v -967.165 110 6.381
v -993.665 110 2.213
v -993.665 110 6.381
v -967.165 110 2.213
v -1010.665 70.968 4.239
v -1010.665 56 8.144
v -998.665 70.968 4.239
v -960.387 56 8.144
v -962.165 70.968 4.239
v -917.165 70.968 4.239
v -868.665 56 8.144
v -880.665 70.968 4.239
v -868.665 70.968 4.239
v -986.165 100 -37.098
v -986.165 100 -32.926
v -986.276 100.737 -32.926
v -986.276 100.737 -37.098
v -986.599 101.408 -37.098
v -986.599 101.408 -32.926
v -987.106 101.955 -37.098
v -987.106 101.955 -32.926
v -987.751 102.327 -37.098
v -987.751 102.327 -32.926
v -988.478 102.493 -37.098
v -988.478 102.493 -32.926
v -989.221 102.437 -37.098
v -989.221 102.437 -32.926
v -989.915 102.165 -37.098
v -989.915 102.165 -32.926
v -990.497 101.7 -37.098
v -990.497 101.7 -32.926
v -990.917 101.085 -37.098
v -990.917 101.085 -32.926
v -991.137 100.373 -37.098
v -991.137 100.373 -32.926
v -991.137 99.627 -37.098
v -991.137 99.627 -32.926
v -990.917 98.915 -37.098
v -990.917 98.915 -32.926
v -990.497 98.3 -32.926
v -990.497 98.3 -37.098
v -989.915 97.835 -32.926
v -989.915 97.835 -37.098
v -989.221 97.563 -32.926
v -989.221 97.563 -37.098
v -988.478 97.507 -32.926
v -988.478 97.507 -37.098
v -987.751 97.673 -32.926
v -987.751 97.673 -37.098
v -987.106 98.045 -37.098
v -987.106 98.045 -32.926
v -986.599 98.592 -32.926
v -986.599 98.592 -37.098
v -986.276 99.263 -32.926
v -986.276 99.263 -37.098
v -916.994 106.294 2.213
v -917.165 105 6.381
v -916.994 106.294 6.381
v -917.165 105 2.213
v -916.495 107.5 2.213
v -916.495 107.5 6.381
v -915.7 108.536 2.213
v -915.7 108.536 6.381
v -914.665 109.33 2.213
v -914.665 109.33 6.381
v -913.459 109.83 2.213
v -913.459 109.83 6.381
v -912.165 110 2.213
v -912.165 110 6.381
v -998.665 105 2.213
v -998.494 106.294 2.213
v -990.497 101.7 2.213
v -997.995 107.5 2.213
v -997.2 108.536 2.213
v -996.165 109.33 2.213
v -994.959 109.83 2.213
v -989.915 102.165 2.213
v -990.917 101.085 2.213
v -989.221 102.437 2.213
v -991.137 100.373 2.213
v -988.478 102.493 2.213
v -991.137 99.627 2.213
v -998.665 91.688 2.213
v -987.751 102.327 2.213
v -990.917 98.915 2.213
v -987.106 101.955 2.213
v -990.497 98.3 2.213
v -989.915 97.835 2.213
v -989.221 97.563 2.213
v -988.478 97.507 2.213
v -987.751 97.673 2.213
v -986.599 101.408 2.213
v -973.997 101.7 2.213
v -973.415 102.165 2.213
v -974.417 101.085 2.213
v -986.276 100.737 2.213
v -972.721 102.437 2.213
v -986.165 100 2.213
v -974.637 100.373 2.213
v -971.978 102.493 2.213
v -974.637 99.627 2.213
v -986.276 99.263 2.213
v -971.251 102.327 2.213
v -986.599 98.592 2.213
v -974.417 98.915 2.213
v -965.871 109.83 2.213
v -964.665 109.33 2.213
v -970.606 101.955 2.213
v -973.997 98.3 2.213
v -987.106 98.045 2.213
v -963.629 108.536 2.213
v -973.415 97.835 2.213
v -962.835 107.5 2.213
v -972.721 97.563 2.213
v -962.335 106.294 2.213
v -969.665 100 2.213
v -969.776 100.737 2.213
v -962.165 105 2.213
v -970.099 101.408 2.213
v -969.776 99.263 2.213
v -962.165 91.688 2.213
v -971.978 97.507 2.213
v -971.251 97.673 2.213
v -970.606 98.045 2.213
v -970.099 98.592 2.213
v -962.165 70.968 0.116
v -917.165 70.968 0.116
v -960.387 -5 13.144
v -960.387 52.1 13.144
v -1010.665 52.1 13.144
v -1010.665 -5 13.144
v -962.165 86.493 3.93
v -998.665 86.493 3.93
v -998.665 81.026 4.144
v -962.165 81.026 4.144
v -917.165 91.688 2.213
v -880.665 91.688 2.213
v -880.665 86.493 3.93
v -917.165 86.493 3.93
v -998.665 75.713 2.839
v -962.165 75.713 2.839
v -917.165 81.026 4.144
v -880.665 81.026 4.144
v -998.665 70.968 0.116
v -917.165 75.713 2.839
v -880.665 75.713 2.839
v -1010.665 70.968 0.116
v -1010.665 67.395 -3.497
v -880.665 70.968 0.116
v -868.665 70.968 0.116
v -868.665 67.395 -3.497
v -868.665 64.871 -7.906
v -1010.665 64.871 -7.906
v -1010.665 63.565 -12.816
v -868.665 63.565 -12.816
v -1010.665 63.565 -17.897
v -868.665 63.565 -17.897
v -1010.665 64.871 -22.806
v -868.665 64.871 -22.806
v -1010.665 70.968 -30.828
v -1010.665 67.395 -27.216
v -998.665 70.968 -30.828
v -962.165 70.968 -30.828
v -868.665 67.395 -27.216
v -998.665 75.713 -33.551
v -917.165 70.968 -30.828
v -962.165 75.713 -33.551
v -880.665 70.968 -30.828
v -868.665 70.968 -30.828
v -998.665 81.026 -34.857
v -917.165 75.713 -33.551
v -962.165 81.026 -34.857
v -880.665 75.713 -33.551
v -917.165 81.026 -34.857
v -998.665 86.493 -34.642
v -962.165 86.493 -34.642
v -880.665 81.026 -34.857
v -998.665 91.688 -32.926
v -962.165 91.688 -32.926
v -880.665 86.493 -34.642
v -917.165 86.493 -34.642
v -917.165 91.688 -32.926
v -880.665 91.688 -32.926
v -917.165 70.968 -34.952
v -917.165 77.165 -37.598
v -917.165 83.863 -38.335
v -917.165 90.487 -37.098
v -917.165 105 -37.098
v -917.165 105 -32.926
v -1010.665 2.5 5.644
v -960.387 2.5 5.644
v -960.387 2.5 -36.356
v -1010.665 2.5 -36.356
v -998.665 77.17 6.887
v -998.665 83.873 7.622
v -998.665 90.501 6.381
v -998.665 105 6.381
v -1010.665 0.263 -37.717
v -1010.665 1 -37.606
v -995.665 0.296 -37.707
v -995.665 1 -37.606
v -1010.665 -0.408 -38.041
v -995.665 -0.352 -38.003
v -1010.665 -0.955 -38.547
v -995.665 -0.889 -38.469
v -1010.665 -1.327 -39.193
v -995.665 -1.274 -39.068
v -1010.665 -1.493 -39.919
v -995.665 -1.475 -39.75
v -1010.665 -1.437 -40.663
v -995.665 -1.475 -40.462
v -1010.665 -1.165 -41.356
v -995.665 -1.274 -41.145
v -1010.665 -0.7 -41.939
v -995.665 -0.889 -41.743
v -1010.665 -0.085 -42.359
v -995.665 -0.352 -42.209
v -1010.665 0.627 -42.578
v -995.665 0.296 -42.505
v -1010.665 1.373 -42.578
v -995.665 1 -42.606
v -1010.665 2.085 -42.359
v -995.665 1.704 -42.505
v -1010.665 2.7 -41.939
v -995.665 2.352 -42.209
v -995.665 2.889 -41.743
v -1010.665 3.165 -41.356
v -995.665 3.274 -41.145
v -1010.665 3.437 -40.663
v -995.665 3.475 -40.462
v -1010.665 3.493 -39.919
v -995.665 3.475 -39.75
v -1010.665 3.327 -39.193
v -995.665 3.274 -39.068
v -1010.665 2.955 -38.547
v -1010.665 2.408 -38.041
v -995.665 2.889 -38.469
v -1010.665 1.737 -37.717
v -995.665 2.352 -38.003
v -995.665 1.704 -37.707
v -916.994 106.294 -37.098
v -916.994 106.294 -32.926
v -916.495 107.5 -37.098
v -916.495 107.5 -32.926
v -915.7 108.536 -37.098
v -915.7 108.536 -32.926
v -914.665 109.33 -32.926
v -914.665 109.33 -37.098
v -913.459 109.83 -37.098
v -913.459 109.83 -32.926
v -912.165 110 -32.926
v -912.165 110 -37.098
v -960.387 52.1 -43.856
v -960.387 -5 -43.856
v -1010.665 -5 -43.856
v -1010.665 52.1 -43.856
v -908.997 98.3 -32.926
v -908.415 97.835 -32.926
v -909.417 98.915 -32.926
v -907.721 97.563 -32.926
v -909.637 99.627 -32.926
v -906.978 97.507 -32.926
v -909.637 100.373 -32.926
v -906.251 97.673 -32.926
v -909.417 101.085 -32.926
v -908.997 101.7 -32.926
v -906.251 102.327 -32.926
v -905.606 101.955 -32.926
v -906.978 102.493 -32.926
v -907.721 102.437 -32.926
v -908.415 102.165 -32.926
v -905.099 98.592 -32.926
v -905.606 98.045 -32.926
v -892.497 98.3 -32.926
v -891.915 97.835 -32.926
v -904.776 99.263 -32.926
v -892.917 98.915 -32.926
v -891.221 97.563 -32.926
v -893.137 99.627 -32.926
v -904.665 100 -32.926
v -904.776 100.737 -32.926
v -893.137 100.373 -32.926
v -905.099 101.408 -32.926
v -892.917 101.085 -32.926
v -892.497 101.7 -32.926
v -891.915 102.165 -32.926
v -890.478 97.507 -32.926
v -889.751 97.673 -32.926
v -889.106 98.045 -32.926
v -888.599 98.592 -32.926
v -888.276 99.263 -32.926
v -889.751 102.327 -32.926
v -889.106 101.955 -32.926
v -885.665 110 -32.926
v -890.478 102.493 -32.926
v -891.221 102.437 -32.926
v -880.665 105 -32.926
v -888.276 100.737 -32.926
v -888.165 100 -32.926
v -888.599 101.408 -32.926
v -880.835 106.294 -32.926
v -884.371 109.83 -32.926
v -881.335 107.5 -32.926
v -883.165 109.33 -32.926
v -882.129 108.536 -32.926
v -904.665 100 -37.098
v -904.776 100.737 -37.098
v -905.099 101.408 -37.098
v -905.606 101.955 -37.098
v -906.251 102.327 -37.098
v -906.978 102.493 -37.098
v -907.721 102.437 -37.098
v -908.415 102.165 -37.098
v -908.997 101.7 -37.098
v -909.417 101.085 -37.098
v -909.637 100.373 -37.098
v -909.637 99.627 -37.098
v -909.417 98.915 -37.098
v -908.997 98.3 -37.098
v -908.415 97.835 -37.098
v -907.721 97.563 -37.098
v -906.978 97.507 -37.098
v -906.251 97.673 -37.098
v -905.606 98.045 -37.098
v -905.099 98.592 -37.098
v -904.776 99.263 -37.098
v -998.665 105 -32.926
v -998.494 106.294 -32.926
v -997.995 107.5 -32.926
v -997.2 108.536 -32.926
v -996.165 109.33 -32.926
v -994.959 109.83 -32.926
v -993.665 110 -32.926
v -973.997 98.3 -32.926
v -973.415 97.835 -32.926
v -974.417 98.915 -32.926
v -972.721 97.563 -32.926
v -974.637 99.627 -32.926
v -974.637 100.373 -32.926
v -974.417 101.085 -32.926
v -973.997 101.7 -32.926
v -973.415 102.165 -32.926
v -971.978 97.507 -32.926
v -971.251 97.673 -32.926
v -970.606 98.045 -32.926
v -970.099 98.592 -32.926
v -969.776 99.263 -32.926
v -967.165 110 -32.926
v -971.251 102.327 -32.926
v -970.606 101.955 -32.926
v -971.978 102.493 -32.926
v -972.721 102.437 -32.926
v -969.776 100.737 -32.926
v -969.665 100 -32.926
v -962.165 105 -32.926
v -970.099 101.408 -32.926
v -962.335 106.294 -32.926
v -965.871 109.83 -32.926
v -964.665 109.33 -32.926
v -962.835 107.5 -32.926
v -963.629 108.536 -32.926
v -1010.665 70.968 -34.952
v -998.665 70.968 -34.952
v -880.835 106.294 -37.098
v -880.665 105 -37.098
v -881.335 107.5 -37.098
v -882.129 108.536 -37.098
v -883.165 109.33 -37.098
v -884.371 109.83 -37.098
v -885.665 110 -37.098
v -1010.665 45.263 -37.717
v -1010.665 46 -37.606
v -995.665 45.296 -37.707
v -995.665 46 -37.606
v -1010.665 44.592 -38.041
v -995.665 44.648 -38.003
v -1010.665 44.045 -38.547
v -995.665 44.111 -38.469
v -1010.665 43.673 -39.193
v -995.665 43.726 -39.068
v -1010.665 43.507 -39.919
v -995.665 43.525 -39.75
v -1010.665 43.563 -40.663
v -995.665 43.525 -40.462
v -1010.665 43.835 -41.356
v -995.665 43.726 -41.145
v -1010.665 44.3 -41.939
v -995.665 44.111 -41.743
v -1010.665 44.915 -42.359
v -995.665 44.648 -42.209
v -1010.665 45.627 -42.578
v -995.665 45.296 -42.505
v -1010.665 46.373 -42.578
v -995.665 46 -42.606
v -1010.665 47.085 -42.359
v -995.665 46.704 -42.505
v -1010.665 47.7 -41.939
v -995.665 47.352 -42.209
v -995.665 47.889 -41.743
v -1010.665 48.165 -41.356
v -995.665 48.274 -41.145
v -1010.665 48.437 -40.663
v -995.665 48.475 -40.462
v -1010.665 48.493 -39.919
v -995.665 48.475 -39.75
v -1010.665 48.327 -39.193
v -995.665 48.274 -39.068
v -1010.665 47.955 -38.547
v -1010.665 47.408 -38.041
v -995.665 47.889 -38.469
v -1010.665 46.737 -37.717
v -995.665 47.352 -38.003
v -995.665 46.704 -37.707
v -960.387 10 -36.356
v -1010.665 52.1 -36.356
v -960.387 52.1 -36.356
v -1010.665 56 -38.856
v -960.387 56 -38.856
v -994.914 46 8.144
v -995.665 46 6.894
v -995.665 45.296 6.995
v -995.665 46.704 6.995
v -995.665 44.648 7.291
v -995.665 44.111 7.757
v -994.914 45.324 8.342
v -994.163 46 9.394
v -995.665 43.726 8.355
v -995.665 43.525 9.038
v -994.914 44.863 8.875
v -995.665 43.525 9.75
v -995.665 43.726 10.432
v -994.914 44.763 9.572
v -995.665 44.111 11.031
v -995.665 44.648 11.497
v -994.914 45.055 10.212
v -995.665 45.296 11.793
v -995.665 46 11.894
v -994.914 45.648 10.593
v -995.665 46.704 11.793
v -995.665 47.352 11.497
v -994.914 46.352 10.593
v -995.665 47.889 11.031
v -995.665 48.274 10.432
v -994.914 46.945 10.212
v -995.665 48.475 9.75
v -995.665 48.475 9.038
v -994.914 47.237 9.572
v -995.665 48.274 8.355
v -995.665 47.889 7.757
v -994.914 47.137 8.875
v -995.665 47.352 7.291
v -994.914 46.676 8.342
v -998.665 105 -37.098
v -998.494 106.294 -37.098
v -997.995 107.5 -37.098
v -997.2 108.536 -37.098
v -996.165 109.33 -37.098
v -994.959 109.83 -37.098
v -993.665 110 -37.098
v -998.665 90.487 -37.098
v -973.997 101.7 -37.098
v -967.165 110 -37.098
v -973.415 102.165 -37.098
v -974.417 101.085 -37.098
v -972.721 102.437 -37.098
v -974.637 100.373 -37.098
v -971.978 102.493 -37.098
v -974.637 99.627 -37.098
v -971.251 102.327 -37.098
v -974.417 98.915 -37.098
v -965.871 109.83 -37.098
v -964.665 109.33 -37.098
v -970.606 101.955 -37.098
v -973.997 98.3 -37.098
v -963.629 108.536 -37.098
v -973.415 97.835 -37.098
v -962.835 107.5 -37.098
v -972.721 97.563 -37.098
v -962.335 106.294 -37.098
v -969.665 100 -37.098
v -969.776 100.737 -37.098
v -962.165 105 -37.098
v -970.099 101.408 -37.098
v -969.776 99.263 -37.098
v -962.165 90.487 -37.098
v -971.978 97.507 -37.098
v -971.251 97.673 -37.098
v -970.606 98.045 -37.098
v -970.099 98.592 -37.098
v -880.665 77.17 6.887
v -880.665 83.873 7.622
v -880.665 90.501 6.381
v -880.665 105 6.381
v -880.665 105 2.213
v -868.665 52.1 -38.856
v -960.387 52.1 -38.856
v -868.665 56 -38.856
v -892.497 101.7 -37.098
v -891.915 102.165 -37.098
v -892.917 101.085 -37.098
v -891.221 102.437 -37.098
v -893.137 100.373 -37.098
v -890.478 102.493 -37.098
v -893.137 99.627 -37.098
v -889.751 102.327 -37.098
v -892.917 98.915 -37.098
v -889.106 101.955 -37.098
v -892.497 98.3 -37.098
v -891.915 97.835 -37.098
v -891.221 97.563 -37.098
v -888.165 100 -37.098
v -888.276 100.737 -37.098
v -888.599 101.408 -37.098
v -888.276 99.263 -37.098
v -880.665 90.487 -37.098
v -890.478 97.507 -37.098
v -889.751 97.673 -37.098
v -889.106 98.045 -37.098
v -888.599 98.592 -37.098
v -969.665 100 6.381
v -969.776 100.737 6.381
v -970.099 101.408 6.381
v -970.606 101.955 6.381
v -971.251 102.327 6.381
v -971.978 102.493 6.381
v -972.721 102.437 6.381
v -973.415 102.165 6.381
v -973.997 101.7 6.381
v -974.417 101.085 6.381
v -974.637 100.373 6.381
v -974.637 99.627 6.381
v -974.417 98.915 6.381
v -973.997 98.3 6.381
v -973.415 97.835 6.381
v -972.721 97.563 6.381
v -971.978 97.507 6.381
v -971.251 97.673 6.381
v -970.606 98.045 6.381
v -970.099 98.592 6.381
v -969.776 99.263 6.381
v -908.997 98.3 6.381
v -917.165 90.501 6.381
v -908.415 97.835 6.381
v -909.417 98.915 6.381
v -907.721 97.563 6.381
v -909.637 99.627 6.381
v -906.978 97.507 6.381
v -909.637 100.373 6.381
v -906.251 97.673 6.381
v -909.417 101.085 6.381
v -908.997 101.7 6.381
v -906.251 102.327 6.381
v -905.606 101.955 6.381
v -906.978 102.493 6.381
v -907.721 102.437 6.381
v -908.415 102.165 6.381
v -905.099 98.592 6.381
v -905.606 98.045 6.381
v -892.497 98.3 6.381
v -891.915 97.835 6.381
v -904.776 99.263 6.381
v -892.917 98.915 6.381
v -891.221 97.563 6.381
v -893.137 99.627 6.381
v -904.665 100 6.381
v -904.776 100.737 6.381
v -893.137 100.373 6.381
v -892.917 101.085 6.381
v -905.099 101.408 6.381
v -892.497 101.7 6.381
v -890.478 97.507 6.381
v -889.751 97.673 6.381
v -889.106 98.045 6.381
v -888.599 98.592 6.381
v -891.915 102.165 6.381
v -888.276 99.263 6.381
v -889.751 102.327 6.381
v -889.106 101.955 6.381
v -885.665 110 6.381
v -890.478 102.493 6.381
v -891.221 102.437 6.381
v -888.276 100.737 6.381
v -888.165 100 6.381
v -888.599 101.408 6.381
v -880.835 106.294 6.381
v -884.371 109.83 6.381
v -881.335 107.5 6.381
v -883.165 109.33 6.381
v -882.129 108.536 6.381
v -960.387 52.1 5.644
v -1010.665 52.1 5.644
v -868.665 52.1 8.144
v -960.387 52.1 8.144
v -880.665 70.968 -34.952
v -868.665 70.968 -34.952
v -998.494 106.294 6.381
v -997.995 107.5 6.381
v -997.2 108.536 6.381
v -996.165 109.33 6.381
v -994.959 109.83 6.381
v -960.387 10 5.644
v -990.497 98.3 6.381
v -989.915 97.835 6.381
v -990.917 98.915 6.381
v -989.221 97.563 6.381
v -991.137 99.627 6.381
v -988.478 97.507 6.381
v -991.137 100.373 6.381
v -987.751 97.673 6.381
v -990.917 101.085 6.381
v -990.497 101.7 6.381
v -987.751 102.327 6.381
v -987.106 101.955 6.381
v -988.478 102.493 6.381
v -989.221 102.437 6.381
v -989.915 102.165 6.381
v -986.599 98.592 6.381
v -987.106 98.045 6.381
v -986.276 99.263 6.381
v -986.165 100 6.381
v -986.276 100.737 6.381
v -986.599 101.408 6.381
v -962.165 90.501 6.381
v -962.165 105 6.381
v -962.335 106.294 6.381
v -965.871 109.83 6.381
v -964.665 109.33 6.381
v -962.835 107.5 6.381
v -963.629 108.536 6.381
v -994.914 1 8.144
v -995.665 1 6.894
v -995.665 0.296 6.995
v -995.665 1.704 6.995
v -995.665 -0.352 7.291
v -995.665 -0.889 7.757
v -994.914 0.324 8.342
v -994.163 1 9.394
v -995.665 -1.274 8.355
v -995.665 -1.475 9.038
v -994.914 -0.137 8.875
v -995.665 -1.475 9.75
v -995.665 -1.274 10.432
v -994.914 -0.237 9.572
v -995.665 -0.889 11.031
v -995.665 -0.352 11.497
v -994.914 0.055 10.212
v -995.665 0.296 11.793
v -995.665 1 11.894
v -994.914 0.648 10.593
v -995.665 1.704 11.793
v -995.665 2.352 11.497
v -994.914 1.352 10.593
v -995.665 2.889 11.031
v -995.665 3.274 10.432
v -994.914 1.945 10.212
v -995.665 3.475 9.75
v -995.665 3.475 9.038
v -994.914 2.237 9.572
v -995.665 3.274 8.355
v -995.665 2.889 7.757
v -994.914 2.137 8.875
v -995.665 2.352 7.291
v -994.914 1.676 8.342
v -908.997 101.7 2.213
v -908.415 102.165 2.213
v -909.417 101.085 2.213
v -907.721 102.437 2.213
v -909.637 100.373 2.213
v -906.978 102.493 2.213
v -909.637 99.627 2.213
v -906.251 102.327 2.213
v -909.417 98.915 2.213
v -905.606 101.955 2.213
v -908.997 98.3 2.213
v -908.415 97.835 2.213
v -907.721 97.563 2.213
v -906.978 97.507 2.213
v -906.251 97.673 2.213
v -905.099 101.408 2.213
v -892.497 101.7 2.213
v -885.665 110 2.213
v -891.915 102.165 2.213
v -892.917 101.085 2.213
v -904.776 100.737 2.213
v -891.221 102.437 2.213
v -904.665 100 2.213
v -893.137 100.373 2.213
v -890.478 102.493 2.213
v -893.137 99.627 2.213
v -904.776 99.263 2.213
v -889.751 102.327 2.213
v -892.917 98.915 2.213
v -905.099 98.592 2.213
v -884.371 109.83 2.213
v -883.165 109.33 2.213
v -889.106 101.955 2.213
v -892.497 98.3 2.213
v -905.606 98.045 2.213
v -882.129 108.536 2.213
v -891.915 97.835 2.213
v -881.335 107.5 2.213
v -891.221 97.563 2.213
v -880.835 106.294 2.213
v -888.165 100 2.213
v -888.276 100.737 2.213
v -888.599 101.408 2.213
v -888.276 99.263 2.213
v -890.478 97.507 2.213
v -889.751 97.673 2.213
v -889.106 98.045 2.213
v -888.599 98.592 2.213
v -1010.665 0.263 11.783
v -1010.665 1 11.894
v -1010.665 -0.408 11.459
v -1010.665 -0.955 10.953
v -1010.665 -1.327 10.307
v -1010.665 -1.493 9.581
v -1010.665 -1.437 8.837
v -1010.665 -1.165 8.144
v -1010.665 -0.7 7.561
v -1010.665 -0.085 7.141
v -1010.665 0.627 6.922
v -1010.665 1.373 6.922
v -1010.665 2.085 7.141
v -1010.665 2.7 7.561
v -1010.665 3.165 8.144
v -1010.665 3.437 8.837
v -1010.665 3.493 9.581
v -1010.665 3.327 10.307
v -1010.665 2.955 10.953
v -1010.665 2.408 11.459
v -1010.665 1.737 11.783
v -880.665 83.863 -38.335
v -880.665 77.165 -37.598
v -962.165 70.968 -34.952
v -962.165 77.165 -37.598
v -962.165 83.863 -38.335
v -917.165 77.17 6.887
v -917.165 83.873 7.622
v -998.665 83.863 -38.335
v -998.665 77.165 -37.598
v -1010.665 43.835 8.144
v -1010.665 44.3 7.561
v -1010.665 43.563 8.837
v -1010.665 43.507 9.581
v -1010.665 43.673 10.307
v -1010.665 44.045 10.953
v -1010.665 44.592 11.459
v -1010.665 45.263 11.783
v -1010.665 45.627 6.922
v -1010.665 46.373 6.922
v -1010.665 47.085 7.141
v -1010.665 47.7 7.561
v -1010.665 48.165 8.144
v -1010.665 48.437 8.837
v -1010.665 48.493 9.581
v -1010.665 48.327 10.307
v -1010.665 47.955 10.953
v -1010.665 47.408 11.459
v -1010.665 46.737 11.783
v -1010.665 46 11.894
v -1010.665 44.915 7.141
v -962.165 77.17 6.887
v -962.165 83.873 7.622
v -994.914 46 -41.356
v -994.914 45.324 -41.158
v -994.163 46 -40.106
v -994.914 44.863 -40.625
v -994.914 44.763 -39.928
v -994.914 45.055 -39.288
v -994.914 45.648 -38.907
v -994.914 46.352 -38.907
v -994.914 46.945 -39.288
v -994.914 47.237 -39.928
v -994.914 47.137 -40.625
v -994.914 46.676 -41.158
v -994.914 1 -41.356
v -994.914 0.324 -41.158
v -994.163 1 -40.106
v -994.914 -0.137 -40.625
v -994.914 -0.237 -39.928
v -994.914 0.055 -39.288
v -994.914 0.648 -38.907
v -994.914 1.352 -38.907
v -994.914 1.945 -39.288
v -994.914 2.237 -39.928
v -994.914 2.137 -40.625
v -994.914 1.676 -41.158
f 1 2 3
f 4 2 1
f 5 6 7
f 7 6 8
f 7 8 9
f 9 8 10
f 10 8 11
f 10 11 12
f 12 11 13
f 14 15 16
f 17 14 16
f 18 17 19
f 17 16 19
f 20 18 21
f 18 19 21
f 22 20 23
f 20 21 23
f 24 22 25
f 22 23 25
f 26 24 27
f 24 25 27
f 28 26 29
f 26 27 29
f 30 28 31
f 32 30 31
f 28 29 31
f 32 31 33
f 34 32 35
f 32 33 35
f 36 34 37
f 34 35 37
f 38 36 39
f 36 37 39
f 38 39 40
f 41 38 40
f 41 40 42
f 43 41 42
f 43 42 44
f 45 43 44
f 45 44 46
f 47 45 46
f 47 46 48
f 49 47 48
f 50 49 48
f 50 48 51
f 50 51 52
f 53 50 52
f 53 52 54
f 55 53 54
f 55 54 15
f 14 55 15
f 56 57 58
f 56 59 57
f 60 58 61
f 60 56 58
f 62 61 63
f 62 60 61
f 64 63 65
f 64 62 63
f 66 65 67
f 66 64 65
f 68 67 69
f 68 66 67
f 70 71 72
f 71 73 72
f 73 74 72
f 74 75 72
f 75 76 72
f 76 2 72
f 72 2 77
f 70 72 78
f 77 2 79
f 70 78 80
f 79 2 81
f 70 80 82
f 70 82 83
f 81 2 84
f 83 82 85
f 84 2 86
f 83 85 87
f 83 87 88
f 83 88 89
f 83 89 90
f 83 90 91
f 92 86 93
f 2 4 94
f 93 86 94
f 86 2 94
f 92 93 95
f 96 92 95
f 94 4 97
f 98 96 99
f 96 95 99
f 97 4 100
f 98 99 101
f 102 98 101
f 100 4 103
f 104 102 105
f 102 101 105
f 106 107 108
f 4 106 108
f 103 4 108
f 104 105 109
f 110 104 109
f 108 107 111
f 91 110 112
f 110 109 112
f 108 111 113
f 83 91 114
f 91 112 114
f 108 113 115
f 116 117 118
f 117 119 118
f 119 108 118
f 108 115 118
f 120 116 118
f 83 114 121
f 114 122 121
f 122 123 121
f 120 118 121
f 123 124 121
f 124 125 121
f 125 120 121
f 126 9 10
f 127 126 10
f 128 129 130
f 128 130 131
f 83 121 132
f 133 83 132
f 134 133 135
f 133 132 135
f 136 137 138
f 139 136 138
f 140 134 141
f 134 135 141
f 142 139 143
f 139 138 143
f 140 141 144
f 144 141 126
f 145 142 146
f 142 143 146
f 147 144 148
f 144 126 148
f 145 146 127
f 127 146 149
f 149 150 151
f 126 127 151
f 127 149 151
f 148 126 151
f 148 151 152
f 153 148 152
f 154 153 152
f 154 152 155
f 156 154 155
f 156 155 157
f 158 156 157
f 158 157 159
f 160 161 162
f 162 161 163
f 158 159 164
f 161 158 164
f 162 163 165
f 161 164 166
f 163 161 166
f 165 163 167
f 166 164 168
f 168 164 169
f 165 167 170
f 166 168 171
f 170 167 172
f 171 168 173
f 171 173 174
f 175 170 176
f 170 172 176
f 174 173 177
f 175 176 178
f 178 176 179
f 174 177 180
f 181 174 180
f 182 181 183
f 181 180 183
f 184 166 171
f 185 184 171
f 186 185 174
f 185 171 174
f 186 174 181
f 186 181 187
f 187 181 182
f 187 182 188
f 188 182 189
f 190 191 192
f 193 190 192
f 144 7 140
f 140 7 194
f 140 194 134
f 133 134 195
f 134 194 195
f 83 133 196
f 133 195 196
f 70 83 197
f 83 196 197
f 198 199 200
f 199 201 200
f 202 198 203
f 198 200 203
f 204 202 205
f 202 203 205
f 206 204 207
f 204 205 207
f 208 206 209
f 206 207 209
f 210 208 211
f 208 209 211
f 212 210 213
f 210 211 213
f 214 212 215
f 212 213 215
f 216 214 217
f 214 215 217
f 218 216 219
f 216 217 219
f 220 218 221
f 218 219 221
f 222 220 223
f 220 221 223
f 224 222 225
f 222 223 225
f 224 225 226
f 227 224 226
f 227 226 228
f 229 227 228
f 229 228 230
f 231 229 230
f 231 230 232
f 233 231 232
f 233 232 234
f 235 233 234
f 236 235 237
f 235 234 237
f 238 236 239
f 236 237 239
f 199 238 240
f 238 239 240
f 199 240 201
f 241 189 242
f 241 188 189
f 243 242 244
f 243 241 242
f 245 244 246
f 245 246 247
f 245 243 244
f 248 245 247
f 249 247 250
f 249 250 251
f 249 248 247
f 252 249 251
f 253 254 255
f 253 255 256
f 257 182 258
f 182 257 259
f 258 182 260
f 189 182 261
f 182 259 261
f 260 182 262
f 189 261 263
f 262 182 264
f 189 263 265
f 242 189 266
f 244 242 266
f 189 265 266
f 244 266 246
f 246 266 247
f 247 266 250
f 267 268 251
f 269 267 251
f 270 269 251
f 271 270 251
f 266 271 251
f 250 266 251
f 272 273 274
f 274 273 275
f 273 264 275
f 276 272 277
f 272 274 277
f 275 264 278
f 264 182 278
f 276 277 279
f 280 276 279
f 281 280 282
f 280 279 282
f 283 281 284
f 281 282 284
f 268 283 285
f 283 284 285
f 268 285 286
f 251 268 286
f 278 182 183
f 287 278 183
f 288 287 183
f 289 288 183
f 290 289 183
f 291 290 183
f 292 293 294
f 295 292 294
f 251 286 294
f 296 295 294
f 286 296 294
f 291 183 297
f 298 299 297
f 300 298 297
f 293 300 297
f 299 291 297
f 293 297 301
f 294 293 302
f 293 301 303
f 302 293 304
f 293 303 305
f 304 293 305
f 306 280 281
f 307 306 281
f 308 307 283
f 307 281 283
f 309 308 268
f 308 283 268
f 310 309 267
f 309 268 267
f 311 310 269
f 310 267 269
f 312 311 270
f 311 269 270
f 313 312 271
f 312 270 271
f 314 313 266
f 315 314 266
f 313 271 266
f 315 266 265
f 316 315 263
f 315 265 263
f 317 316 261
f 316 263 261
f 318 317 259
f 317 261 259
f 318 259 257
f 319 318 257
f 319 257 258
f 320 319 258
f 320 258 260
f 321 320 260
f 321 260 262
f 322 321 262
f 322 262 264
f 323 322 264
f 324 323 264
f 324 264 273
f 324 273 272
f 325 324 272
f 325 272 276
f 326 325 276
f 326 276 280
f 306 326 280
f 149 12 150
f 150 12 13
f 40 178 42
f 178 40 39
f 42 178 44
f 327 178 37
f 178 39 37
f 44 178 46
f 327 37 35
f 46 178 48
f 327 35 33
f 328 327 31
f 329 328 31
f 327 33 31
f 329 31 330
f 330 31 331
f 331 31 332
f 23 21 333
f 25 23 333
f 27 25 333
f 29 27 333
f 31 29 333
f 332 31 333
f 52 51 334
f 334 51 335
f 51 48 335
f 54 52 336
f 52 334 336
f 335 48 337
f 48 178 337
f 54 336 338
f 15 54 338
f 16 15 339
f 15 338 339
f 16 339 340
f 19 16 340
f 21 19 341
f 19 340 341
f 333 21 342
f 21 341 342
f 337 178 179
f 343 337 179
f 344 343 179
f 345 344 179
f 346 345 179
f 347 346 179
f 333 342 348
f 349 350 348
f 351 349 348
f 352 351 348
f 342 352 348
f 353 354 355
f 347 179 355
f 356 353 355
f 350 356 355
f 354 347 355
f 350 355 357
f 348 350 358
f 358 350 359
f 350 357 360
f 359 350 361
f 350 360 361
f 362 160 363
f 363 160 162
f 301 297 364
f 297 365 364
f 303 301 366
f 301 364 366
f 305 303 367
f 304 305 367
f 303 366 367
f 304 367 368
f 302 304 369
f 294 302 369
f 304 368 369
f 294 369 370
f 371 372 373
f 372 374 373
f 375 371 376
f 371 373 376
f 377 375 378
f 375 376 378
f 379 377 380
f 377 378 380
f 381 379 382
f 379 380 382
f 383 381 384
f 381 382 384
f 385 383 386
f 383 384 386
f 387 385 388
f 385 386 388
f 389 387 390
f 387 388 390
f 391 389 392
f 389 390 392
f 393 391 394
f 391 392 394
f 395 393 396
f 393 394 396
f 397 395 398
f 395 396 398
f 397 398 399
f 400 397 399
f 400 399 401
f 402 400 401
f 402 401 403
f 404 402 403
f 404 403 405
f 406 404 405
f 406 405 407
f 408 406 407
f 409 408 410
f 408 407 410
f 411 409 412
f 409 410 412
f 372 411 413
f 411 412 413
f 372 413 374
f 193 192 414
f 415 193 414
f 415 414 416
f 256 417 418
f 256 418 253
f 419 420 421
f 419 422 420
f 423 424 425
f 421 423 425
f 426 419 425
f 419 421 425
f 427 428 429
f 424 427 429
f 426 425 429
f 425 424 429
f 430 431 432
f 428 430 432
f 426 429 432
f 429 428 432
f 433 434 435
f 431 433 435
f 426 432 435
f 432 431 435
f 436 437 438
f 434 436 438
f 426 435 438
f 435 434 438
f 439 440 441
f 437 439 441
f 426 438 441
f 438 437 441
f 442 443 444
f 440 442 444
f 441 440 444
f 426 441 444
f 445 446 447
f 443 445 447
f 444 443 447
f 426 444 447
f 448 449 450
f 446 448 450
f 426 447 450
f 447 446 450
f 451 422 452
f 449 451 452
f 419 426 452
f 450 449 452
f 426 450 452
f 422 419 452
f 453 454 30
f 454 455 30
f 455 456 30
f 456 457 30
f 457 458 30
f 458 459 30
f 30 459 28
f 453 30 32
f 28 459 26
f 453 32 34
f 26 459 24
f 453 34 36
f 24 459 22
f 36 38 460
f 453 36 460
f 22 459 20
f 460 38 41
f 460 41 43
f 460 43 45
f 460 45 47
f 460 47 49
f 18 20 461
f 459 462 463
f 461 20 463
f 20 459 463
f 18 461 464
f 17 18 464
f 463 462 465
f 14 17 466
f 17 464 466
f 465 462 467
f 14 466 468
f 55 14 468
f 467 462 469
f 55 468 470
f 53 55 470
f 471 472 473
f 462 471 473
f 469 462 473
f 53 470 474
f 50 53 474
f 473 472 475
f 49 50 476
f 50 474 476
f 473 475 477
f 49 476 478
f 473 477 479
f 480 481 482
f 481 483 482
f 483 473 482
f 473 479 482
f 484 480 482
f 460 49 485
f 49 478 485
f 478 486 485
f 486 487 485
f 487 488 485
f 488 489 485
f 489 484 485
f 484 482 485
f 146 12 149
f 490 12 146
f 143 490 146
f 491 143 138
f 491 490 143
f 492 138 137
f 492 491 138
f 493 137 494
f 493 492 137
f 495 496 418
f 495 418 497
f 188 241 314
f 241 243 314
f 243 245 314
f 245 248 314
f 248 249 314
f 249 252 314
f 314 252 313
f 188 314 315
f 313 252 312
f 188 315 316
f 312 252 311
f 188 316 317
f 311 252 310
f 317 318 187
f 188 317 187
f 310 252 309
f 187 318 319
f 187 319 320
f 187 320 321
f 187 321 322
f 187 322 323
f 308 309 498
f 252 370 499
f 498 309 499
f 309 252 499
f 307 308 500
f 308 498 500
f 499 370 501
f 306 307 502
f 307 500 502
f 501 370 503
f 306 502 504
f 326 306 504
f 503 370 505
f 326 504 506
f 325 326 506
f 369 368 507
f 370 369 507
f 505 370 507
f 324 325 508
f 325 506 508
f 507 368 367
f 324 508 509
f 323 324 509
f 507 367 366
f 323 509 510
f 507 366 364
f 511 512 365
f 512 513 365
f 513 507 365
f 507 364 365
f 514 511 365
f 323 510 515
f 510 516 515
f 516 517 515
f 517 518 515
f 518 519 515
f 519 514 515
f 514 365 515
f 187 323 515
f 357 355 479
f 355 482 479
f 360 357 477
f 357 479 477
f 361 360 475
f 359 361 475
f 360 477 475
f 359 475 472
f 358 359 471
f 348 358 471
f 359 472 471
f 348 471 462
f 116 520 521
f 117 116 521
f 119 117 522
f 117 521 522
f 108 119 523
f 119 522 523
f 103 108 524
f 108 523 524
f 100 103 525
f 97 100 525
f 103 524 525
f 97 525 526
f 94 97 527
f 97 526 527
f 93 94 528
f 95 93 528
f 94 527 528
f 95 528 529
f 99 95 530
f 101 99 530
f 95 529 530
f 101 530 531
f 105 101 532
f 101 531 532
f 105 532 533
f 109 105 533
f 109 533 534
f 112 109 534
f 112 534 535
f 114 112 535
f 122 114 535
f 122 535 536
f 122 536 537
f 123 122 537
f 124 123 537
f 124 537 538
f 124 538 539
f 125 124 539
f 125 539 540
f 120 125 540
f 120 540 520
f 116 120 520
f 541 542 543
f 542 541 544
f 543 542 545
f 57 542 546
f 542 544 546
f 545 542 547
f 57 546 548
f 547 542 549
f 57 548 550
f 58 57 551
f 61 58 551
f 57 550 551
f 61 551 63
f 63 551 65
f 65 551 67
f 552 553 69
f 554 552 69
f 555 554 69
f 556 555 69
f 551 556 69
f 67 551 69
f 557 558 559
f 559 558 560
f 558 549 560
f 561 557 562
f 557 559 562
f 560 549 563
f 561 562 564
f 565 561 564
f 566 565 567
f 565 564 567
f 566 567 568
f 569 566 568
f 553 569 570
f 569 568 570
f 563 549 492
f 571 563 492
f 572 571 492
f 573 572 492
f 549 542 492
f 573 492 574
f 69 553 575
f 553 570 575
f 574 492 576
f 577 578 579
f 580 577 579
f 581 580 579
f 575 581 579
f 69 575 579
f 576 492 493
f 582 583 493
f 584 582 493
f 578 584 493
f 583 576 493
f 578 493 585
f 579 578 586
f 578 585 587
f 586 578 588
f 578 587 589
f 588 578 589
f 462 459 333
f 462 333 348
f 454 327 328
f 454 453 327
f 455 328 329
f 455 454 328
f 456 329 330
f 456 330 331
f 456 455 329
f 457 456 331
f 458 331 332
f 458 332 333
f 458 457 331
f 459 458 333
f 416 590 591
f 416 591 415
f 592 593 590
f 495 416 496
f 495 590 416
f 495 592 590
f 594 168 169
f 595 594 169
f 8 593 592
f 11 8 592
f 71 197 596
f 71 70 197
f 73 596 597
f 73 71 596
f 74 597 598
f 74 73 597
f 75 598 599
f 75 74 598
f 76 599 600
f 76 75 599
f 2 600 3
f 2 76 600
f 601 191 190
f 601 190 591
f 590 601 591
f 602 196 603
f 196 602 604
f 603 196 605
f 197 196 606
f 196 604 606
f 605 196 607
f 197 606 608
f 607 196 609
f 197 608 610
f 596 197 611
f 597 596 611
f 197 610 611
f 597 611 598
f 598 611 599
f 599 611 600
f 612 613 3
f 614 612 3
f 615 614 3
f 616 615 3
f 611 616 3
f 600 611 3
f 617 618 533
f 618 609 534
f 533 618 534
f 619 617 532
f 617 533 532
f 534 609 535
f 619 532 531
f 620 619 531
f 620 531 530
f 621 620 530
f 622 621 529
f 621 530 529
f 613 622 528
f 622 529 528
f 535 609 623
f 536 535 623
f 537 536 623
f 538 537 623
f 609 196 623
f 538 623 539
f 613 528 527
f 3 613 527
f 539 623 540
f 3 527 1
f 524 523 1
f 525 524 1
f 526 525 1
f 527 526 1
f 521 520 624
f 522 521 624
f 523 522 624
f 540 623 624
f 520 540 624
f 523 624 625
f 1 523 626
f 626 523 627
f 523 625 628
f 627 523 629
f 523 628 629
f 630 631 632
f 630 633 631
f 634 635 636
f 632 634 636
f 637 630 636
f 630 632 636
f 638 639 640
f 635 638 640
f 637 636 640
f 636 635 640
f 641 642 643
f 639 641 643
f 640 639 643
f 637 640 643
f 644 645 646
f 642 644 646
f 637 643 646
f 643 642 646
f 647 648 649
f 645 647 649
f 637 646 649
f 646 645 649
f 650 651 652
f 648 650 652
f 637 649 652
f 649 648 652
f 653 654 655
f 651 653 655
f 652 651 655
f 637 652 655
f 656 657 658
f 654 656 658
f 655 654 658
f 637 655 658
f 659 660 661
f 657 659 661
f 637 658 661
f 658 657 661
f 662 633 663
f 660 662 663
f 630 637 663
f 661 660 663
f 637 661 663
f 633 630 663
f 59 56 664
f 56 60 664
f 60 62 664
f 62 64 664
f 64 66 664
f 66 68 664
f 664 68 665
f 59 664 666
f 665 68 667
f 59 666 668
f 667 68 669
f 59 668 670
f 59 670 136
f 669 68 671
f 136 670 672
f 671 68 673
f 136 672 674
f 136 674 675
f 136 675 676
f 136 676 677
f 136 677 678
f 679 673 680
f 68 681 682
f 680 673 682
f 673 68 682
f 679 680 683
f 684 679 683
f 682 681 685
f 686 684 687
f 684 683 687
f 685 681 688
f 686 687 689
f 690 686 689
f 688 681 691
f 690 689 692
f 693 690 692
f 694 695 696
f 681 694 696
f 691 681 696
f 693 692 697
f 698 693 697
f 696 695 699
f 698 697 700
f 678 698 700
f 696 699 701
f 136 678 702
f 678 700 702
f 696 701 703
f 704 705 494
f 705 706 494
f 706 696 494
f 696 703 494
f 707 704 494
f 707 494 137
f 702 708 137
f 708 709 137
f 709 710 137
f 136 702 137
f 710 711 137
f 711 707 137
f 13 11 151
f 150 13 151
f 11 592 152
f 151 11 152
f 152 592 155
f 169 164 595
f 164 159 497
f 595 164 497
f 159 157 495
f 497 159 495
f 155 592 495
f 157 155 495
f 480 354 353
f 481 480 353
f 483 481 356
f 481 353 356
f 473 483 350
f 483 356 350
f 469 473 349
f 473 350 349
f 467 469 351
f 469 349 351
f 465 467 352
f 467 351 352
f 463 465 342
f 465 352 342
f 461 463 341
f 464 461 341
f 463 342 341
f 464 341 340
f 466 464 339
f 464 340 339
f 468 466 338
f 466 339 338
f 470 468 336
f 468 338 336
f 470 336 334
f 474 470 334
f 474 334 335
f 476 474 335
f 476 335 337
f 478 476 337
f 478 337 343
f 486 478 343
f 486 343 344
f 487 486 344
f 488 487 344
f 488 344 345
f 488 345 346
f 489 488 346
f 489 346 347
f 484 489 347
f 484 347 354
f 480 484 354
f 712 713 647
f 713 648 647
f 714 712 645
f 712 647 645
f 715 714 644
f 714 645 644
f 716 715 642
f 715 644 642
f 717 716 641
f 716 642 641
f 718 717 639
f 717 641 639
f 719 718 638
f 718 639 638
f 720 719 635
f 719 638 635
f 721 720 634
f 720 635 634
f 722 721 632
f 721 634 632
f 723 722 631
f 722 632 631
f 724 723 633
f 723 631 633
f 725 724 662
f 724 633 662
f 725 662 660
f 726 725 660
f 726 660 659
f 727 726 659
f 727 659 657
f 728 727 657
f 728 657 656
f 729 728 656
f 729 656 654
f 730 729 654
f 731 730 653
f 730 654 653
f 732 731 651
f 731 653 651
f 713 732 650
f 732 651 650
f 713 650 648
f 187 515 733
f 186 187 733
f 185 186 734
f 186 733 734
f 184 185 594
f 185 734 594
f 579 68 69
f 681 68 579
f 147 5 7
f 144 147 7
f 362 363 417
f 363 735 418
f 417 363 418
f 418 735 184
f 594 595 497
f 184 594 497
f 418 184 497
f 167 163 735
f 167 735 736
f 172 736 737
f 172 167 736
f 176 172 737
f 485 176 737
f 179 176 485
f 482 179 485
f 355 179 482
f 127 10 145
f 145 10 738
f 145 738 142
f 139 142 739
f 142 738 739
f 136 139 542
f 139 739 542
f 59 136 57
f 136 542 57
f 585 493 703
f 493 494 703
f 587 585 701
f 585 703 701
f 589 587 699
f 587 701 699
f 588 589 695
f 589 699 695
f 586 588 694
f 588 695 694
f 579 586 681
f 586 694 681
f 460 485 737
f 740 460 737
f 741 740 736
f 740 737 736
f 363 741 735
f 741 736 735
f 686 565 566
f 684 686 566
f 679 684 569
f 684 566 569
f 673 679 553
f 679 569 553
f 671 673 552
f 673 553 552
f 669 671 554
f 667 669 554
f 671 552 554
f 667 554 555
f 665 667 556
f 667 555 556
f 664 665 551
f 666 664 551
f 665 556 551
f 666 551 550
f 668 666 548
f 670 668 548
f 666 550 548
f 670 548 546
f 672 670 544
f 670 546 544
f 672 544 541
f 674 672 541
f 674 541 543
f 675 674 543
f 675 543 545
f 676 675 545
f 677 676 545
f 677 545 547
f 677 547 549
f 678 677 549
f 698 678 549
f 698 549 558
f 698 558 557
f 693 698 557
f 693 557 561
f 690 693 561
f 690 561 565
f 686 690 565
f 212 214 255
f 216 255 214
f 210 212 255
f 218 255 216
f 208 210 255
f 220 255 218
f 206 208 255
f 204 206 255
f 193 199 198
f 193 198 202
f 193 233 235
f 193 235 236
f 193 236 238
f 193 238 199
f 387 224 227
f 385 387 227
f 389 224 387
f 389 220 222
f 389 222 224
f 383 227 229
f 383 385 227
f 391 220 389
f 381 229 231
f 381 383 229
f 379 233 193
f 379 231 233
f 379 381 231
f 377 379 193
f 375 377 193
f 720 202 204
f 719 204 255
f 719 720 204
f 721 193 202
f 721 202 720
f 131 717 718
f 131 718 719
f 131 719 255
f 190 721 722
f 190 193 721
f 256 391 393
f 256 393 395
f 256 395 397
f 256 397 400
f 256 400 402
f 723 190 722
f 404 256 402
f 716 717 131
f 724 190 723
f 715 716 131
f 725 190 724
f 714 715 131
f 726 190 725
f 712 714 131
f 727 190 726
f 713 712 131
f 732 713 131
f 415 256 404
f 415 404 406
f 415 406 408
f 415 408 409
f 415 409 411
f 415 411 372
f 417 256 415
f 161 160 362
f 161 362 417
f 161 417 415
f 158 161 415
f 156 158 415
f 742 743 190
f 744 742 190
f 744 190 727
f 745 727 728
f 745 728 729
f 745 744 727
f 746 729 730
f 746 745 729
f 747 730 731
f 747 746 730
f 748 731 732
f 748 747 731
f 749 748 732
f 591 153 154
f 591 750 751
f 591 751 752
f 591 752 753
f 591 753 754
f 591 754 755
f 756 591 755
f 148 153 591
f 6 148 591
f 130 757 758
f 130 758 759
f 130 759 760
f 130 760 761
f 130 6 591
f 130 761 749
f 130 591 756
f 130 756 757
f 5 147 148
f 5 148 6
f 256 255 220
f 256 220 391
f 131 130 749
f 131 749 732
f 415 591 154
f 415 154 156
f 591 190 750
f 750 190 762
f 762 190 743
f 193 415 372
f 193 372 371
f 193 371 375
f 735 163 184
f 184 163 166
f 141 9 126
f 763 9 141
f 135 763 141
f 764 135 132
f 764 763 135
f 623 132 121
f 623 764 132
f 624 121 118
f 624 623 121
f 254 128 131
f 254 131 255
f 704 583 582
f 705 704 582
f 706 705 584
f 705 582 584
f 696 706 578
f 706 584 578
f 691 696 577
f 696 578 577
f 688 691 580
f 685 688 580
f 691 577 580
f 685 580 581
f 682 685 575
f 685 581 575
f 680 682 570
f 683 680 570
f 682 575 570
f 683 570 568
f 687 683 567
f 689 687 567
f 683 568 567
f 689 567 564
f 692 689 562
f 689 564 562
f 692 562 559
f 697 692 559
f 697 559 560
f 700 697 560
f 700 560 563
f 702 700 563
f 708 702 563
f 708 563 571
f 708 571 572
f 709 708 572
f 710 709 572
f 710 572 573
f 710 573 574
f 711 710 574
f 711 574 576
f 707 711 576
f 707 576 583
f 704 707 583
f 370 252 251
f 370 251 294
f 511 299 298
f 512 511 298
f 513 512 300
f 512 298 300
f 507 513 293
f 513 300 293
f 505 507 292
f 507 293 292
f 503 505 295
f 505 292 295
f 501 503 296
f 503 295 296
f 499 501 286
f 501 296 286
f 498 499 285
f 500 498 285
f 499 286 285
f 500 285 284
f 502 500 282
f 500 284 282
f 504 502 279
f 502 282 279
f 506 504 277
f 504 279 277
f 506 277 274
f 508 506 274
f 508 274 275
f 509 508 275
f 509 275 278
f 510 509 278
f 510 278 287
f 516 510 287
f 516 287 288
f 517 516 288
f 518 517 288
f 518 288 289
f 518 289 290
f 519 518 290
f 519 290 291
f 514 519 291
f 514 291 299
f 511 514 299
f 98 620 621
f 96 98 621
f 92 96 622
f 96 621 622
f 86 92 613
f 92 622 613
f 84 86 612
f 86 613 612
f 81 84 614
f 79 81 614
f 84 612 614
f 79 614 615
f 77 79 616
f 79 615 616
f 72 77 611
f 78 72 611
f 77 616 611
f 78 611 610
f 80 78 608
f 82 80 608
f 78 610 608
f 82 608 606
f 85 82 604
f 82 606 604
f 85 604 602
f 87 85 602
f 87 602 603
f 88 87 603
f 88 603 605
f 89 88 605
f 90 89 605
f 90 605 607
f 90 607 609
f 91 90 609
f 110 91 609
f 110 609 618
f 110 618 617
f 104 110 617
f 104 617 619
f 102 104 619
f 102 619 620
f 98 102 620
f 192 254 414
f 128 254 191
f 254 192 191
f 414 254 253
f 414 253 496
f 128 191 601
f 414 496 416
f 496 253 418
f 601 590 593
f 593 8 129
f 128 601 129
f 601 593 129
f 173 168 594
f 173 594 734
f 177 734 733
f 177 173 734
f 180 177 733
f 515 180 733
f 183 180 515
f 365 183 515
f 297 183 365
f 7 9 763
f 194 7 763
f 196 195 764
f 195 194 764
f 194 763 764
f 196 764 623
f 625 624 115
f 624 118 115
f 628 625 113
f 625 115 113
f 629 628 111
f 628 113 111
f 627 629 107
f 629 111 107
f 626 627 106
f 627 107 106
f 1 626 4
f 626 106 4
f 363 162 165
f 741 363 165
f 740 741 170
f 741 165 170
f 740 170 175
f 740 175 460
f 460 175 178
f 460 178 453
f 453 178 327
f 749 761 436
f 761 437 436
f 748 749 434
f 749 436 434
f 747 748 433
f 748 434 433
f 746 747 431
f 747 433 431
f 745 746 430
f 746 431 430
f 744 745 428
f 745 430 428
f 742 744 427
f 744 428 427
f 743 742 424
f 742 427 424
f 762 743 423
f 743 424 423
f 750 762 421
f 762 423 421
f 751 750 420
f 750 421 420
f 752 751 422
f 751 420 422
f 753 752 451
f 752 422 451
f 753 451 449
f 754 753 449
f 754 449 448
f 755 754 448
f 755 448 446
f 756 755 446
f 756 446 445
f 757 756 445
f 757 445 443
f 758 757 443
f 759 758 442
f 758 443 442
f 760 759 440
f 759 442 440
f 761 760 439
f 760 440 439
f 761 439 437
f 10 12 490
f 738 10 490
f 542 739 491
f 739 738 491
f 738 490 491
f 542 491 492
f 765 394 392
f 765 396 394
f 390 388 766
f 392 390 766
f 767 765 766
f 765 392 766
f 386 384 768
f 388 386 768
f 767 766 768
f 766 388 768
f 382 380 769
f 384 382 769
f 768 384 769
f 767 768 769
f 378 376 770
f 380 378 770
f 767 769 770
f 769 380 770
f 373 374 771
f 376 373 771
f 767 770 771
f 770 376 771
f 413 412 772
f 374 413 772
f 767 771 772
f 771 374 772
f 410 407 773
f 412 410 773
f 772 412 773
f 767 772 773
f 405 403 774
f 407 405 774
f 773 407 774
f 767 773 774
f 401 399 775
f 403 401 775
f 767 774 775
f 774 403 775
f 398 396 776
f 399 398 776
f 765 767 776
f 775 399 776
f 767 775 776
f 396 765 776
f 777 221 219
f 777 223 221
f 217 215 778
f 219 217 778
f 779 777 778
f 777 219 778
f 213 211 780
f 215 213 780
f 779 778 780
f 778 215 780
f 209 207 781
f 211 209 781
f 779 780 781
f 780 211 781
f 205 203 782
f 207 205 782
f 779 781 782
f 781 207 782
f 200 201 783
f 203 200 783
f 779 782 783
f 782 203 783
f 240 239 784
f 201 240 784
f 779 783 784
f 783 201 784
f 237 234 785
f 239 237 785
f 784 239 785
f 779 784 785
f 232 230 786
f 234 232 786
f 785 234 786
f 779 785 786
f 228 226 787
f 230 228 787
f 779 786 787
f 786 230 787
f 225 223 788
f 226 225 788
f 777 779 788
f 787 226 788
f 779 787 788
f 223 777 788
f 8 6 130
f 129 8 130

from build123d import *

# Parameters (mm, degrees)
SKETCH1_W             = 142
SKETCH1_H             = 47
BOSS_EXTRUDE1_DEPTH   = 110
SKETCH2_W             = 42
SKETCH2_H             = 49.6
CUT_EXTRUDE1_DEPTH    = 137
SKETCH4_W             = 33.598594883
SKETCH4_H             = 47
CUT_EXTRUDE3_DEPTH    = 10
CUT_EXTRUDE9_DEPTH    = 184.776508378
SKETCH8_W             = 12
SKETCH8_H             = 39.032308198
SKETCH8_W_2           = 45
CUT_EXTRUDE12_DEPTH   = 1018.719156625
SKETCH11_R            = 2.5
CUT_EXTRUDE13_DEPTH   = 1018.639266937
FILLET5_R             = 5
SKETCH13_W            = 47
SKETCH13_H            = 52.1
CUT_EXTRUDE14_DEPTH   = 91.7220084
BOSS_EXTRUDE2_DEPTH   = 50.2779916
BOSS_EXTRUDE3_DEPTH   = 50.2779916
SKETCH17_W            = 42
SKETCH17_H            = 49.6
CUT_EXTRUDE15_DEPTH   = 182.086628796
M6_TAPPED_HOLE1_D     = 5
M6_TAPPED_HOLE1_DEPTH = 15
M6_TAPPED_HOLE1_TIP   = 1.502151548


with BuildPart() as part:
    # Sketch1 → Boss-Extrude1 (new body)
    with BuildSketch(Plane(origin=(0, 0, 0), x_dir=(1, 0, 0), z_dir=(0, 1, 0))):
        with Locations((-939.664772198, 15.356209692)):
            Rectangle(SKETCH1_W, SKETCH1_H)
    extrude(amount=BOSS_EXTRUDE1_DEPTH)

    # Sketch2 → Cut-Extrude1 (cut)
    with BuildSketch(Plane(origin=(-868.664772198, 0, 0), x_dir=(0, 0, -1), z_dir=(1, 0, 0))):
        with Locations((15.356209692, 27.3)):
            Rectangle(SKETCH2_W, SKETCH2_H)
    extrude(amount=-CUT_EXTRUDE1_DEPTH, mode=Mode.SUBTRACT)

    # Sketch4 → Cut-Extrude3 (cut)
    with BuildSketch(Plane.XZ):
        with Locations((-943.587483157, -15.356209692)):
            Rectangle(SKETCH4_W, SKETCH4_H)
    extrude(amount=-CUT_EXTRUDE3_DEPTH, mode=Mode.SUBTRACT)

    # Sketch5 → Cut-Extrude9 (cut, through all)
    with BuildSketch(Plane(origin=(-868.664772198, 0, 0), x_dir=(0, 0, -1), z_dir=(1, 0, 0))):
        with BuildLine():
            Line((32.925507135, 110), (-2.21308775, 110))
            Line((-2.21308775, 110), (-2.21308775, 91.687910414))
            ThreePointArc((-2.21308775, 91.687910414), (15.356209692, 63.4), (32.925507135, 91.687910414))
            Line((32.925507135, 91.687910414), (32.925507135, 110))
        make_face()
        with BuildLine():
            Line((-6.380897296, 90.501069346), (-6.380897296, 110))
            Line((-6.380897296, 110), (-8.143790308, 110))
            Line((-8.143790308, 110), (-8.143790308, 56))
            Line((-8.143790308, 56), (-4.23948935, 70.967691802))
            ThreePointArc((-4.23948935, 70.967691802), (-7.501795977, 80.49411924), (-6.380897296, 90.501069346))
        make_face()
        with BuildLine():
            ThreePointArc((37.098087644, 90.487229439), (38.21341655, 80.486843377), (34.951908735, 70.967691802))
            Line((34.951908735, 70.967691802), (38.856209692, 56))
            Line((38.856209692, 56), (38.856209692, 110))
            Line((38.856209692, 110), (37.098087644, 110))
            Line((37.098087644, 110), (37.098087644, 90.487229439))
        make_face()
    extrude(amount=-CUT_EXTRUDE9_DEPTH, mode=Mode.SUBTRACT)

    # Sketch8 → Cut-Extrude12 (cut, through all)
    with BuildSketch(Plane.XY.offset(8.143790308)):
        with Locations((-1004.664772198, 90.483845901)):
            Rectangle(SKETCH8_W, SKETCH8_H)
        with Locations((-939.664772198, 90.483845901)):
            Rectangle(SKETCH8_W_2, SKETCH8_H)
        with Locations((-874.664772198, 90.483845901)):
            Rectangle(SKETCH8_W, SKETCH8_H)
    extrude(amount=-CUT_EXTRUDE12_DEPTH, mode=Mode.SUBTRACT)

    # Sketch11 → Cut-Extrude13 (cut, through all)
    with BuildSketch(Plane.XY.offset(6.380897296)):
        with Locations((-988.664772198, 100)):
            Circle(SKETCH11_R)
        with Locations((-972.164772198, 100)):
            Circle(SKETCH11_R)
        with Locations((-907.164772198, 100)):
            Circle(SKETCH11_R)
        with Locations((-890.664772198, 100)):
            Circle(SKETCH11_R)
    extrude(amount=-CUT_EXTRUDE13_DEPTH, mode=Mode.SUBTRACT)

    # Fillet5
    fillet5_edges = [part.edges().sort_by_distance(p)[0] for p in [
        (-998.664772198, 110, 4.296992523),
        (-998.664772198, 110, -35.01179739),
        (-917.164772198, 110, 4.296992523),
        (-962.164772198, 110, 4.296992523),
        (-962.164772198, 110, -35.01179739),
        (-917.164772198, 110, -35.01179739),
        (-880.664772198, 110, 4.296992523),
        (-880.664772198, 110, -35.01179739),
    ]]
    fillet(fillet5_edges, radius=FILLET5_R)

    # Sketch13 → Cut-Extrude14 (cut)
    with BuildSketch(Plane(origin=(-868.664772198, 0, 0), x_dir=(0, 0, -1), z_dir=(1, 0, 0))):
        with Locations((15.356209692, 26.05)):
            Rectangle(SKETCH13_W, SKETCH13_H)
    extrude(amount=-CUT_EXTRUDE14_DEPTH, mode=Mode.SUBTRACT)

    # Sketch15 → Boss-Extrude2 (add)
    with BuildSketch(Plane(origin=(-960.386780598, 0, 0), x_dir=(0, 0, -1), z_dir=(1, 0, 0))):
        Polygon((-8.143790308, 52.1), (-13.143790308, 52.1), (-13.143790308, -5), (43.856209692, -5), (43.856209692, 52.1), (38.856209692, 52.1), (38.856209692, 0), (-8.143790308, 0), align=None)
    extrude(amount=-BOSS_EXTRUDE2_DEPTH)

    # Sketch16 → Boss-Extrude3 (add)
    with BuildSketch(Plane.ZY.offset(1010.664772198)):
        Polygon((-38.856209692, 56), (-43.856209692, 52.1), (-38.856209692, 52.1), align=None)
        Polygon((8.143790308, 56), (13.143790308, 52.1), (8.143790308, 52.1), align=None)
    extrude(amount=-BOSS_EXTRUDE3_DEPTH)

    # Sketch17 → Cut-Extrude15 (cut, through all)
    with BuildSketch(Plane(origin=(-1005.664772198, 0, 0), x_dir=(0, 0, -1), z_dir=(1, 0, 0))):
        with Locations((15.356209692, 27.3)):
            Rectangle(SKETCH17_W, SKETCH17_H)
    extrude(amount=-CUT_EXTRUDE15_DEPTH, mode=Mode.SUBTRACT)

    # M6 Tapped Hole1
    with Locations(Plane(origin=(-1010.664772198, 46, -40.106209692), x_dir=(0, 0, -1), z_dir=(-1, 0, 0))):
        with Locations((0, 0), (0, 45), (-49.5, 45), (-49.5, 0)):
            Hole(M6_TAPPED_HOLE1_D / 2, depth=M6_TAPPED_HOLE1_DEPTH)
            with Locations((0, 0, -(M6_TAPPED_HOLE1_DEPTH + M6_TAPPED_HOLE1_TIP / 2))):  # 118° drill point
                Cone(0, M6_TAPPED_HOLE1_D / 2, M6_TAPPED_HOLE1_TIP, mode=Mode.SUBTRACT)


solid = part.part
